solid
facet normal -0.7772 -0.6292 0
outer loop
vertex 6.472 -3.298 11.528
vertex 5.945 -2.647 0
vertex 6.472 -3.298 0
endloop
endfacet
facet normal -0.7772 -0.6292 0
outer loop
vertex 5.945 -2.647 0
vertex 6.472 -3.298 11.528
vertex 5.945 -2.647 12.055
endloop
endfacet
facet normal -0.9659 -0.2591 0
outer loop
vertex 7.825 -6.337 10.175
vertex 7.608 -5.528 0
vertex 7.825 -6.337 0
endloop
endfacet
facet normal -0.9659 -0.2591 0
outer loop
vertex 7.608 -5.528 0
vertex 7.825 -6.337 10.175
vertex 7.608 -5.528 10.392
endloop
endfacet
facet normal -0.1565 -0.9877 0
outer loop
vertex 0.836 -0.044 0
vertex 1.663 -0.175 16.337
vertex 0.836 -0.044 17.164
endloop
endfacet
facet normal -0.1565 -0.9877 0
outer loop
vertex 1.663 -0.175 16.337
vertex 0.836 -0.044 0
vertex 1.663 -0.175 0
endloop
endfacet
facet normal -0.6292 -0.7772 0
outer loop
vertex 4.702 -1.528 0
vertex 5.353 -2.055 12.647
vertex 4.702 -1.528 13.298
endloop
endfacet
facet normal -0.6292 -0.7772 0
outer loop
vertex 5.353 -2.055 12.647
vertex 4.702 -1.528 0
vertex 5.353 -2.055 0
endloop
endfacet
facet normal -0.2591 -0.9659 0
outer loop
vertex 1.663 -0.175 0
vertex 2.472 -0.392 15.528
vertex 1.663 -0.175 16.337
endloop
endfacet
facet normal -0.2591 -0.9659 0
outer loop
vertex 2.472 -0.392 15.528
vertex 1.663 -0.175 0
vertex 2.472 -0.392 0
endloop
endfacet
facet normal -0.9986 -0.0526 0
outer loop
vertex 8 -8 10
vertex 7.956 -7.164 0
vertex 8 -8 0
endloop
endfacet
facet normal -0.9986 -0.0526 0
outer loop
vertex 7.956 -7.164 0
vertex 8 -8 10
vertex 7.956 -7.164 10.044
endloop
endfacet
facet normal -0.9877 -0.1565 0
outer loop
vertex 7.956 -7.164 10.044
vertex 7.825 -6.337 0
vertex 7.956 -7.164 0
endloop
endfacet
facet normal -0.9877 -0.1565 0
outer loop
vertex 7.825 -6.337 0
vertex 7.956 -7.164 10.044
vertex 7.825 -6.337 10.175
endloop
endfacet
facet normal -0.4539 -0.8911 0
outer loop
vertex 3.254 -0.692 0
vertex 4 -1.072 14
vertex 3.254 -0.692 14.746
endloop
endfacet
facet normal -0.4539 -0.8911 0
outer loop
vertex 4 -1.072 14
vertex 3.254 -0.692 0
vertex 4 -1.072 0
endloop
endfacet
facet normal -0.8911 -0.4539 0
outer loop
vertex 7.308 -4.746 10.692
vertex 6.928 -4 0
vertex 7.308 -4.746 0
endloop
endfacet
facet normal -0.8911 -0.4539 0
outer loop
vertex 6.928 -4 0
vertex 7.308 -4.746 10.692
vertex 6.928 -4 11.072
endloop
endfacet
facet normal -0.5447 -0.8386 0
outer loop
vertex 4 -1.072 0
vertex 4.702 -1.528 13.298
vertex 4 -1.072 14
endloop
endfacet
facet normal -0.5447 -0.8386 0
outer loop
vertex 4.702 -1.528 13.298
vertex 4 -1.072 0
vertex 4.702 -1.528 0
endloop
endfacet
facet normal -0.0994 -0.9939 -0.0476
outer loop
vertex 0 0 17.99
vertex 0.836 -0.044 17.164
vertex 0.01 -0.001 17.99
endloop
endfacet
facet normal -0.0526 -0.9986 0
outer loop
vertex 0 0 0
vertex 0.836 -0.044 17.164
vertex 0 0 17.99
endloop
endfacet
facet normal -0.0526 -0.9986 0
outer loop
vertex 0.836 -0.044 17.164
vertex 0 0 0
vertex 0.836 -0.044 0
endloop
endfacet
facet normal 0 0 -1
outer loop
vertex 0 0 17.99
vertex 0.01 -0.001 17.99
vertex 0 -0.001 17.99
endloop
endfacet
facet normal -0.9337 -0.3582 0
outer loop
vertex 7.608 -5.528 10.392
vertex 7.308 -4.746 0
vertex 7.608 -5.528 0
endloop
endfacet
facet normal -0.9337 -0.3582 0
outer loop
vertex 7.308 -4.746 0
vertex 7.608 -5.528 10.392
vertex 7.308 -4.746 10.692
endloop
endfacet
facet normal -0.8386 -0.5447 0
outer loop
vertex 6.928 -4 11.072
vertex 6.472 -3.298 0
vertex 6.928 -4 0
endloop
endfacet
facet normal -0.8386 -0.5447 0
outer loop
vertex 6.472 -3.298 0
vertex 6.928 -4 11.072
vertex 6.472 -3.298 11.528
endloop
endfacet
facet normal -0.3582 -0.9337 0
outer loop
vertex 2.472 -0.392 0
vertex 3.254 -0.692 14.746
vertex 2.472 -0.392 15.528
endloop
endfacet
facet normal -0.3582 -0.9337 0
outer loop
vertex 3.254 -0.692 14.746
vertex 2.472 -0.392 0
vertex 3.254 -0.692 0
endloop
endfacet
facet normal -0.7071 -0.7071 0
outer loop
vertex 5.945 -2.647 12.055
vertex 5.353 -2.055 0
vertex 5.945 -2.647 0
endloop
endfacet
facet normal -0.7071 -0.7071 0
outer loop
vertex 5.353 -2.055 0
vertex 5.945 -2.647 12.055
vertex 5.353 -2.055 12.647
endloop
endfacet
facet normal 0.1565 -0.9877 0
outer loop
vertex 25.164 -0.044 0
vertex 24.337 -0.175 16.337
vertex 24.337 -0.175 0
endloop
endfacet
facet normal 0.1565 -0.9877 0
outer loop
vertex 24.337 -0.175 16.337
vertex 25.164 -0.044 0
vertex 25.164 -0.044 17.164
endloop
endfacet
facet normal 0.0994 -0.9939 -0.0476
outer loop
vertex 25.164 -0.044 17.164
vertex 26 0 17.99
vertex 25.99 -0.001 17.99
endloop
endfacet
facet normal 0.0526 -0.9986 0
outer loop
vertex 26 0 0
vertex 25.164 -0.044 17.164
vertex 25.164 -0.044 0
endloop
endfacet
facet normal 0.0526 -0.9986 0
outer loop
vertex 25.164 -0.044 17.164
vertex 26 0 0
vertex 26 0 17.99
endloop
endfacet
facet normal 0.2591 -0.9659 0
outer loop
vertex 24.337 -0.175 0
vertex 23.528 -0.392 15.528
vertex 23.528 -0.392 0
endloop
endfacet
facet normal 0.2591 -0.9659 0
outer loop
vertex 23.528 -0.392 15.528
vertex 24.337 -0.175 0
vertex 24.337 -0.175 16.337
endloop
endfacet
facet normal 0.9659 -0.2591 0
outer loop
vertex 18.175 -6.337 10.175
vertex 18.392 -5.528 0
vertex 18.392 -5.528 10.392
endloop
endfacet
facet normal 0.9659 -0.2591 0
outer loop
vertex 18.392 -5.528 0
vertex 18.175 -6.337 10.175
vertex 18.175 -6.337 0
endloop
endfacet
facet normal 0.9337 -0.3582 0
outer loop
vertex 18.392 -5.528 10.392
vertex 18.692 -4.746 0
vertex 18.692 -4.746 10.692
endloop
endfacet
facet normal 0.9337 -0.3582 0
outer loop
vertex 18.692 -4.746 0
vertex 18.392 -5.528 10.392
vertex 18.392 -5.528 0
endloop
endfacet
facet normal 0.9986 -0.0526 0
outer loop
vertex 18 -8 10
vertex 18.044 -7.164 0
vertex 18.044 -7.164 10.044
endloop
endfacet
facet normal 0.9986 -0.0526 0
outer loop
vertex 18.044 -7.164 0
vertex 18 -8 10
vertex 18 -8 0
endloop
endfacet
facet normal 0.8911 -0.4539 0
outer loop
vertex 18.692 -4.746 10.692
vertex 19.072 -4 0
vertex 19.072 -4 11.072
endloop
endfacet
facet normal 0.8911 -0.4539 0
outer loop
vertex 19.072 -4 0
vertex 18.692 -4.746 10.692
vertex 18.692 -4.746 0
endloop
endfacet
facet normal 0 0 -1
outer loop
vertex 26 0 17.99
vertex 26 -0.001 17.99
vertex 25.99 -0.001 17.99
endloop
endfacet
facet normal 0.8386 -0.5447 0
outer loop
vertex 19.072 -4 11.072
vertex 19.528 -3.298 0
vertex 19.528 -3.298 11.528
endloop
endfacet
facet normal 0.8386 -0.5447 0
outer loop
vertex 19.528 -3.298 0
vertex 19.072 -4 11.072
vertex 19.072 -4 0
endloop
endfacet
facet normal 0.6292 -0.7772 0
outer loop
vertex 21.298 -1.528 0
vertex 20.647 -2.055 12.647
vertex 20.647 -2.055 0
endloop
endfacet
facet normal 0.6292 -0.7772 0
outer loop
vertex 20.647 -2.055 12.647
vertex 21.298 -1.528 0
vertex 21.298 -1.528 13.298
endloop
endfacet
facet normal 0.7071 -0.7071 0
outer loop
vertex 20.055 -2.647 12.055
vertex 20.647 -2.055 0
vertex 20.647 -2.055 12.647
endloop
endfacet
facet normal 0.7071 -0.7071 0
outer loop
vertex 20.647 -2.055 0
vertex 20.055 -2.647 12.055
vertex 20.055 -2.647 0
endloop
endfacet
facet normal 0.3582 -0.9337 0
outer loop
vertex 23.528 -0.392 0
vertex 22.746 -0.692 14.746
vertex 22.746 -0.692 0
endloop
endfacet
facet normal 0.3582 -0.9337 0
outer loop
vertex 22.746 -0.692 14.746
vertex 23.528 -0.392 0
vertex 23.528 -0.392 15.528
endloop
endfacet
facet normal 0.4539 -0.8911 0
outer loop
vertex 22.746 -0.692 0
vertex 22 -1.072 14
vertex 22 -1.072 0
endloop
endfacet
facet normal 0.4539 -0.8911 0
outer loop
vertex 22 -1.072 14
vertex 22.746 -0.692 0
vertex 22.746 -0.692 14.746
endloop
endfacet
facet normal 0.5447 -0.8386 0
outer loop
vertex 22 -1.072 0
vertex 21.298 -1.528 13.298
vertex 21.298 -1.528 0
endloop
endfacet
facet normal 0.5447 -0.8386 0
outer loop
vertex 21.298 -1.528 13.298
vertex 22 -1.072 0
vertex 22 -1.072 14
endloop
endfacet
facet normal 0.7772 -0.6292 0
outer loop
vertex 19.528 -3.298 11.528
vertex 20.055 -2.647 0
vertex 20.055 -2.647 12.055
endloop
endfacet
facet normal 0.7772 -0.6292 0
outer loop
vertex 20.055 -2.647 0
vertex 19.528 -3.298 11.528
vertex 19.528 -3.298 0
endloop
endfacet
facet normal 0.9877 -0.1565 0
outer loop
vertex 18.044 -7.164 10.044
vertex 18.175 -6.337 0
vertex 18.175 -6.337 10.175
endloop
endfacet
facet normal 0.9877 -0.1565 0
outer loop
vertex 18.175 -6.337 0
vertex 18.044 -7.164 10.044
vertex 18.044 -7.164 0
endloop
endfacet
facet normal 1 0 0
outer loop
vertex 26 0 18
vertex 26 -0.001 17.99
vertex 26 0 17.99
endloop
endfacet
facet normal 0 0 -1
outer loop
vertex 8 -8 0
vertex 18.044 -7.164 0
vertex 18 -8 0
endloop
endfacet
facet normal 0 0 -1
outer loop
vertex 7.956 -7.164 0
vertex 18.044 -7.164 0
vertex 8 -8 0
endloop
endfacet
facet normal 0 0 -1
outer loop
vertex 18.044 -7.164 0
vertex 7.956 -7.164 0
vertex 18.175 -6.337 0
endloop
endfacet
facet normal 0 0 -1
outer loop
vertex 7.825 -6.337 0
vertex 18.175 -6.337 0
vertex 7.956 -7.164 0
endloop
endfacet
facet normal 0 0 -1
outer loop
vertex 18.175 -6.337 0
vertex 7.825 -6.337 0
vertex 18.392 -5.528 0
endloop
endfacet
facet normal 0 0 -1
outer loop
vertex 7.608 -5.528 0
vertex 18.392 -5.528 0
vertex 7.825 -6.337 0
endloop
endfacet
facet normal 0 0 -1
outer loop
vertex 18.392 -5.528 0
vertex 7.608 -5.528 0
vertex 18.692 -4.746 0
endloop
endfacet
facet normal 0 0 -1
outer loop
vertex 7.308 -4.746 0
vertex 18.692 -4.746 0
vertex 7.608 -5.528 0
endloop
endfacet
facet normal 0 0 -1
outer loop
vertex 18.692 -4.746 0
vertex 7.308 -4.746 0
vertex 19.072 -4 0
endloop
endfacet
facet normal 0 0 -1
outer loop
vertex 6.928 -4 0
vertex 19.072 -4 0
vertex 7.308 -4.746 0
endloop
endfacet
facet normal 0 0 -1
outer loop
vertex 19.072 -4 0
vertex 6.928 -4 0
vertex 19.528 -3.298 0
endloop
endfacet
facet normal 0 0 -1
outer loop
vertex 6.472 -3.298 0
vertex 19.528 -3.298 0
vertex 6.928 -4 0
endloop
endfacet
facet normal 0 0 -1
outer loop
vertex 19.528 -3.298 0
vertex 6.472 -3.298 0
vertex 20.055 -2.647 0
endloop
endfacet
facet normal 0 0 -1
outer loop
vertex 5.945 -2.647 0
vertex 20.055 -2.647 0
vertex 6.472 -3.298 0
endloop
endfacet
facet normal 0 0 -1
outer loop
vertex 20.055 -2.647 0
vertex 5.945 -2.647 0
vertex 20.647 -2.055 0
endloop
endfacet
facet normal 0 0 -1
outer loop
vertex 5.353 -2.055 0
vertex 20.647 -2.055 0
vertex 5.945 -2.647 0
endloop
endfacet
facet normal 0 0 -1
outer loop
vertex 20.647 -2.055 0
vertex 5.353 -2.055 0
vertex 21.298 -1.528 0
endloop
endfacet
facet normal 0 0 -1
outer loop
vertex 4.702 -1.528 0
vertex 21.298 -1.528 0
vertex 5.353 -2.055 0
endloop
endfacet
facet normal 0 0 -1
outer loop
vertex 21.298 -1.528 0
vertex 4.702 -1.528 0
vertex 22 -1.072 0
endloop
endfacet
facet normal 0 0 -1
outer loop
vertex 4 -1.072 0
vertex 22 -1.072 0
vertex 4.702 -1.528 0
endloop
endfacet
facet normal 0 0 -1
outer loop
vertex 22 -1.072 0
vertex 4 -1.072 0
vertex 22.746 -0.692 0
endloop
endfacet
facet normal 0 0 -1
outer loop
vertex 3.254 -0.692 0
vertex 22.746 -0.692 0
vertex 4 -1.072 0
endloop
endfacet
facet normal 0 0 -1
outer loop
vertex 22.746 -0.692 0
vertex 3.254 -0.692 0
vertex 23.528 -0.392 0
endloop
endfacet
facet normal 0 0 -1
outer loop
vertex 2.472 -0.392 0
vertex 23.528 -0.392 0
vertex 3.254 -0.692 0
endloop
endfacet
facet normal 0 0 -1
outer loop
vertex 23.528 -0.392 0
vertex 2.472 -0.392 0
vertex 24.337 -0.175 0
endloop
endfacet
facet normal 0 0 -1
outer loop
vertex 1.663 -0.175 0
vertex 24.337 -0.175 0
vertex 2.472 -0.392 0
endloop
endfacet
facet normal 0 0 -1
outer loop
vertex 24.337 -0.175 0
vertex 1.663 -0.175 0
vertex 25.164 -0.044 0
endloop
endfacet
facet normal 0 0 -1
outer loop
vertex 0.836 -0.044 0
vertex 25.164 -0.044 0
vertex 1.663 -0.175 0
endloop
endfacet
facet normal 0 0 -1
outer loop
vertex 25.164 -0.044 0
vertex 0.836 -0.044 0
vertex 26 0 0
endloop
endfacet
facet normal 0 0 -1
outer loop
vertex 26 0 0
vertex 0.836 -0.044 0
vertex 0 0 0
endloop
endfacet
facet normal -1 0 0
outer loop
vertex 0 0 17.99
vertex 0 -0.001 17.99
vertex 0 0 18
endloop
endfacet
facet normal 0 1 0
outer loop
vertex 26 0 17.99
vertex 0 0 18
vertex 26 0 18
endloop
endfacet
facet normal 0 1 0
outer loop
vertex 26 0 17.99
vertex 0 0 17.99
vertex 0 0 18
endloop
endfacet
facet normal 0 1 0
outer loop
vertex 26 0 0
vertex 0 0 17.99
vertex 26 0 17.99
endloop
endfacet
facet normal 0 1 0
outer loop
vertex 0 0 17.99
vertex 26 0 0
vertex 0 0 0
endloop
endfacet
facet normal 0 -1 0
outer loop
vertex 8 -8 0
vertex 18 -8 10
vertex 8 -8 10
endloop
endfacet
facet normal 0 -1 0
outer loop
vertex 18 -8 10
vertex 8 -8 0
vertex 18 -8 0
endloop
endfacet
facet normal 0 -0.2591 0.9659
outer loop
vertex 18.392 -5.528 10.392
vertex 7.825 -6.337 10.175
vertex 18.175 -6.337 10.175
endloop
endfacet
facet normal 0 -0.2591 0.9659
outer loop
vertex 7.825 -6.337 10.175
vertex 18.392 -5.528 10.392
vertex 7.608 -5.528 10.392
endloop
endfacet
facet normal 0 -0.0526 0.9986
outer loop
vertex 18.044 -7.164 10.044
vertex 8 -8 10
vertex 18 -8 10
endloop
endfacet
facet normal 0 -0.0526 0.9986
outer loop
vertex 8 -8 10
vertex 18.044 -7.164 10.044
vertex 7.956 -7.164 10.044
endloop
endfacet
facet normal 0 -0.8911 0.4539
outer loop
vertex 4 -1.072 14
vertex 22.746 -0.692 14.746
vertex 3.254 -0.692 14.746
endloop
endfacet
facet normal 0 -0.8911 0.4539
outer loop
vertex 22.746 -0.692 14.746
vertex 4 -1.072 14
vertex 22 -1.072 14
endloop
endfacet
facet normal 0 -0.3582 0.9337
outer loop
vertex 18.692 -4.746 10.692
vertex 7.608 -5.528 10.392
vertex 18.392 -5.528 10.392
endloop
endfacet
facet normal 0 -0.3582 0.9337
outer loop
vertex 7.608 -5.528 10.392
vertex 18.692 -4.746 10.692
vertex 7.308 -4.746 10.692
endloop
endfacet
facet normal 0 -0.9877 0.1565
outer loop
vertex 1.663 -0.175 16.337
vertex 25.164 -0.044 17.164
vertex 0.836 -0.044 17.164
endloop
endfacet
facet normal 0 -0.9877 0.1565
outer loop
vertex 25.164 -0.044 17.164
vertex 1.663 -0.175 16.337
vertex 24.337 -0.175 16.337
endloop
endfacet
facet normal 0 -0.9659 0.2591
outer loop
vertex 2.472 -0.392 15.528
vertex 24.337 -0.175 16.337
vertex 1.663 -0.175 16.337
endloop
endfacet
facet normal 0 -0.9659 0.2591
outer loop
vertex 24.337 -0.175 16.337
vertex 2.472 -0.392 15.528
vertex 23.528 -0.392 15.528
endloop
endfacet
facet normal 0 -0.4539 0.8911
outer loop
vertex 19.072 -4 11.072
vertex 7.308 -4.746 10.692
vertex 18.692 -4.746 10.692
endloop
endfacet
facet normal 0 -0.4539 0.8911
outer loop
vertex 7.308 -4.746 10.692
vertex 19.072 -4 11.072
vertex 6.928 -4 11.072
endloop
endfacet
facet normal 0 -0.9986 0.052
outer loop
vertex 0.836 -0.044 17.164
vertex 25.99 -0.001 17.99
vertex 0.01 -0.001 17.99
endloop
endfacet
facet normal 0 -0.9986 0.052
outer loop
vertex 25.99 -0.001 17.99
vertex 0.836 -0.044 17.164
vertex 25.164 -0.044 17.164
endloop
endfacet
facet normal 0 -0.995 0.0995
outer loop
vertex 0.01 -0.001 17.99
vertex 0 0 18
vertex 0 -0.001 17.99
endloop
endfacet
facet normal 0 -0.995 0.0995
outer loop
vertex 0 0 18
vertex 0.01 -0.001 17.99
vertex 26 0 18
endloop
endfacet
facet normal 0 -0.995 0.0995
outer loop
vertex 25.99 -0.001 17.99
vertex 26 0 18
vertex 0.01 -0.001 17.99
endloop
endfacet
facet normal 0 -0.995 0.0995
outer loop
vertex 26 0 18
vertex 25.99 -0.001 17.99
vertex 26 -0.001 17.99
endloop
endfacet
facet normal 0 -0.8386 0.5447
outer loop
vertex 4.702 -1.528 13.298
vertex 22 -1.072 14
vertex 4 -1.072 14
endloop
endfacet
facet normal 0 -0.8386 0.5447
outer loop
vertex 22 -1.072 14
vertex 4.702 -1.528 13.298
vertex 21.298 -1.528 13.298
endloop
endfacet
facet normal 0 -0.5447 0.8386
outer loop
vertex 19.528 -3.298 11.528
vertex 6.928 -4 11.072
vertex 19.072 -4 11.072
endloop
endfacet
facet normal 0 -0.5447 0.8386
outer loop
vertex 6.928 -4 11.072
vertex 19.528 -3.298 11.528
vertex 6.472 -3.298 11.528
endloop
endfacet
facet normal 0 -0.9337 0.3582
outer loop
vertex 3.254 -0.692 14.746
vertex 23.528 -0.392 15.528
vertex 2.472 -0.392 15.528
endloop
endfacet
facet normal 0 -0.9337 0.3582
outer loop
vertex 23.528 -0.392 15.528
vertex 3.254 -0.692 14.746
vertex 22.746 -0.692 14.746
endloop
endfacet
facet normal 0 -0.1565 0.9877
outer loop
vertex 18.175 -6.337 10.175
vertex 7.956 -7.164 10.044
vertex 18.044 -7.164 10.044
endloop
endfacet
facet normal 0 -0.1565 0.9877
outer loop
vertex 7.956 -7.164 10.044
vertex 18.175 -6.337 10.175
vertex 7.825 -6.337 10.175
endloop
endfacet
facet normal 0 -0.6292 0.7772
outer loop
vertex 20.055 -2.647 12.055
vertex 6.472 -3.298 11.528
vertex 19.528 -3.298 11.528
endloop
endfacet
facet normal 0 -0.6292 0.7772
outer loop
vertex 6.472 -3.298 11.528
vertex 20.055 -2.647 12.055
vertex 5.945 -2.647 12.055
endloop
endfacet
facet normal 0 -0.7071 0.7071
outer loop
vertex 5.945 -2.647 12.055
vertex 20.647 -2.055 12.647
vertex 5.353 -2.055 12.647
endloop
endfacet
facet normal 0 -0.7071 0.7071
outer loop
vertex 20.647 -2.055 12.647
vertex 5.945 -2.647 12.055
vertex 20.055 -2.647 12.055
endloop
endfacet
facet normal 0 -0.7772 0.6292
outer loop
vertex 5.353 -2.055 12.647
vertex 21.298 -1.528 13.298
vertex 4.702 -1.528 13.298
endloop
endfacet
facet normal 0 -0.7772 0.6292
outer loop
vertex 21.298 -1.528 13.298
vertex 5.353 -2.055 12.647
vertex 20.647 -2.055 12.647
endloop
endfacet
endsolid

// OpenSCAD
// 2016Au12, v0.0.1, ls (http://www.thingiverse.com/Bushmills)
//                    initial version
//    
// creates a parametrised filled 90° T-joint. Those provide better
// resistance against breaking off the jointed leg than a square edge-on connect.   
// example:
// joint(20, 10, 8);
//    produces a T-joint piece 20mm wide, 10mm deep, with joint radius of 8mm.
//    no leg or bar to join are generated. Only the minimum volume filled
//    by the joint is the result.
//    As backs of joints are flat, they are easily printable.

// ***********************************************************
// ************ thingiverse customiser section ***************
//            (remove section when adding file to library)

width=10;    // [4:40]

depth=10;    // [4:40]

radius=8;    // [1:20]

$fn=60;      // [8:90]

joint(width, depth, radius);

// ***********************************************************

module joint(Breite, Tiefe, Radius)  {
	translate([0, -Radius, 0])
	difference()  {
		cube([Radius*2+Breite, Radius, Radius+Tiefe]);

		for (x=[0, Radius*2+Breite]) {		// left and right
			translate([x, 0, -0.01])
			rotate([0, 0,  90])
			cylinder(Radius+Tiefe, Radius, Radius);
		}

		translate([0, 0, Tiefe+Radius])		// front
		rotate([0, 90, 0])
		cylinder(Radius*2+Breite, Radius, Radius);
	}
}
